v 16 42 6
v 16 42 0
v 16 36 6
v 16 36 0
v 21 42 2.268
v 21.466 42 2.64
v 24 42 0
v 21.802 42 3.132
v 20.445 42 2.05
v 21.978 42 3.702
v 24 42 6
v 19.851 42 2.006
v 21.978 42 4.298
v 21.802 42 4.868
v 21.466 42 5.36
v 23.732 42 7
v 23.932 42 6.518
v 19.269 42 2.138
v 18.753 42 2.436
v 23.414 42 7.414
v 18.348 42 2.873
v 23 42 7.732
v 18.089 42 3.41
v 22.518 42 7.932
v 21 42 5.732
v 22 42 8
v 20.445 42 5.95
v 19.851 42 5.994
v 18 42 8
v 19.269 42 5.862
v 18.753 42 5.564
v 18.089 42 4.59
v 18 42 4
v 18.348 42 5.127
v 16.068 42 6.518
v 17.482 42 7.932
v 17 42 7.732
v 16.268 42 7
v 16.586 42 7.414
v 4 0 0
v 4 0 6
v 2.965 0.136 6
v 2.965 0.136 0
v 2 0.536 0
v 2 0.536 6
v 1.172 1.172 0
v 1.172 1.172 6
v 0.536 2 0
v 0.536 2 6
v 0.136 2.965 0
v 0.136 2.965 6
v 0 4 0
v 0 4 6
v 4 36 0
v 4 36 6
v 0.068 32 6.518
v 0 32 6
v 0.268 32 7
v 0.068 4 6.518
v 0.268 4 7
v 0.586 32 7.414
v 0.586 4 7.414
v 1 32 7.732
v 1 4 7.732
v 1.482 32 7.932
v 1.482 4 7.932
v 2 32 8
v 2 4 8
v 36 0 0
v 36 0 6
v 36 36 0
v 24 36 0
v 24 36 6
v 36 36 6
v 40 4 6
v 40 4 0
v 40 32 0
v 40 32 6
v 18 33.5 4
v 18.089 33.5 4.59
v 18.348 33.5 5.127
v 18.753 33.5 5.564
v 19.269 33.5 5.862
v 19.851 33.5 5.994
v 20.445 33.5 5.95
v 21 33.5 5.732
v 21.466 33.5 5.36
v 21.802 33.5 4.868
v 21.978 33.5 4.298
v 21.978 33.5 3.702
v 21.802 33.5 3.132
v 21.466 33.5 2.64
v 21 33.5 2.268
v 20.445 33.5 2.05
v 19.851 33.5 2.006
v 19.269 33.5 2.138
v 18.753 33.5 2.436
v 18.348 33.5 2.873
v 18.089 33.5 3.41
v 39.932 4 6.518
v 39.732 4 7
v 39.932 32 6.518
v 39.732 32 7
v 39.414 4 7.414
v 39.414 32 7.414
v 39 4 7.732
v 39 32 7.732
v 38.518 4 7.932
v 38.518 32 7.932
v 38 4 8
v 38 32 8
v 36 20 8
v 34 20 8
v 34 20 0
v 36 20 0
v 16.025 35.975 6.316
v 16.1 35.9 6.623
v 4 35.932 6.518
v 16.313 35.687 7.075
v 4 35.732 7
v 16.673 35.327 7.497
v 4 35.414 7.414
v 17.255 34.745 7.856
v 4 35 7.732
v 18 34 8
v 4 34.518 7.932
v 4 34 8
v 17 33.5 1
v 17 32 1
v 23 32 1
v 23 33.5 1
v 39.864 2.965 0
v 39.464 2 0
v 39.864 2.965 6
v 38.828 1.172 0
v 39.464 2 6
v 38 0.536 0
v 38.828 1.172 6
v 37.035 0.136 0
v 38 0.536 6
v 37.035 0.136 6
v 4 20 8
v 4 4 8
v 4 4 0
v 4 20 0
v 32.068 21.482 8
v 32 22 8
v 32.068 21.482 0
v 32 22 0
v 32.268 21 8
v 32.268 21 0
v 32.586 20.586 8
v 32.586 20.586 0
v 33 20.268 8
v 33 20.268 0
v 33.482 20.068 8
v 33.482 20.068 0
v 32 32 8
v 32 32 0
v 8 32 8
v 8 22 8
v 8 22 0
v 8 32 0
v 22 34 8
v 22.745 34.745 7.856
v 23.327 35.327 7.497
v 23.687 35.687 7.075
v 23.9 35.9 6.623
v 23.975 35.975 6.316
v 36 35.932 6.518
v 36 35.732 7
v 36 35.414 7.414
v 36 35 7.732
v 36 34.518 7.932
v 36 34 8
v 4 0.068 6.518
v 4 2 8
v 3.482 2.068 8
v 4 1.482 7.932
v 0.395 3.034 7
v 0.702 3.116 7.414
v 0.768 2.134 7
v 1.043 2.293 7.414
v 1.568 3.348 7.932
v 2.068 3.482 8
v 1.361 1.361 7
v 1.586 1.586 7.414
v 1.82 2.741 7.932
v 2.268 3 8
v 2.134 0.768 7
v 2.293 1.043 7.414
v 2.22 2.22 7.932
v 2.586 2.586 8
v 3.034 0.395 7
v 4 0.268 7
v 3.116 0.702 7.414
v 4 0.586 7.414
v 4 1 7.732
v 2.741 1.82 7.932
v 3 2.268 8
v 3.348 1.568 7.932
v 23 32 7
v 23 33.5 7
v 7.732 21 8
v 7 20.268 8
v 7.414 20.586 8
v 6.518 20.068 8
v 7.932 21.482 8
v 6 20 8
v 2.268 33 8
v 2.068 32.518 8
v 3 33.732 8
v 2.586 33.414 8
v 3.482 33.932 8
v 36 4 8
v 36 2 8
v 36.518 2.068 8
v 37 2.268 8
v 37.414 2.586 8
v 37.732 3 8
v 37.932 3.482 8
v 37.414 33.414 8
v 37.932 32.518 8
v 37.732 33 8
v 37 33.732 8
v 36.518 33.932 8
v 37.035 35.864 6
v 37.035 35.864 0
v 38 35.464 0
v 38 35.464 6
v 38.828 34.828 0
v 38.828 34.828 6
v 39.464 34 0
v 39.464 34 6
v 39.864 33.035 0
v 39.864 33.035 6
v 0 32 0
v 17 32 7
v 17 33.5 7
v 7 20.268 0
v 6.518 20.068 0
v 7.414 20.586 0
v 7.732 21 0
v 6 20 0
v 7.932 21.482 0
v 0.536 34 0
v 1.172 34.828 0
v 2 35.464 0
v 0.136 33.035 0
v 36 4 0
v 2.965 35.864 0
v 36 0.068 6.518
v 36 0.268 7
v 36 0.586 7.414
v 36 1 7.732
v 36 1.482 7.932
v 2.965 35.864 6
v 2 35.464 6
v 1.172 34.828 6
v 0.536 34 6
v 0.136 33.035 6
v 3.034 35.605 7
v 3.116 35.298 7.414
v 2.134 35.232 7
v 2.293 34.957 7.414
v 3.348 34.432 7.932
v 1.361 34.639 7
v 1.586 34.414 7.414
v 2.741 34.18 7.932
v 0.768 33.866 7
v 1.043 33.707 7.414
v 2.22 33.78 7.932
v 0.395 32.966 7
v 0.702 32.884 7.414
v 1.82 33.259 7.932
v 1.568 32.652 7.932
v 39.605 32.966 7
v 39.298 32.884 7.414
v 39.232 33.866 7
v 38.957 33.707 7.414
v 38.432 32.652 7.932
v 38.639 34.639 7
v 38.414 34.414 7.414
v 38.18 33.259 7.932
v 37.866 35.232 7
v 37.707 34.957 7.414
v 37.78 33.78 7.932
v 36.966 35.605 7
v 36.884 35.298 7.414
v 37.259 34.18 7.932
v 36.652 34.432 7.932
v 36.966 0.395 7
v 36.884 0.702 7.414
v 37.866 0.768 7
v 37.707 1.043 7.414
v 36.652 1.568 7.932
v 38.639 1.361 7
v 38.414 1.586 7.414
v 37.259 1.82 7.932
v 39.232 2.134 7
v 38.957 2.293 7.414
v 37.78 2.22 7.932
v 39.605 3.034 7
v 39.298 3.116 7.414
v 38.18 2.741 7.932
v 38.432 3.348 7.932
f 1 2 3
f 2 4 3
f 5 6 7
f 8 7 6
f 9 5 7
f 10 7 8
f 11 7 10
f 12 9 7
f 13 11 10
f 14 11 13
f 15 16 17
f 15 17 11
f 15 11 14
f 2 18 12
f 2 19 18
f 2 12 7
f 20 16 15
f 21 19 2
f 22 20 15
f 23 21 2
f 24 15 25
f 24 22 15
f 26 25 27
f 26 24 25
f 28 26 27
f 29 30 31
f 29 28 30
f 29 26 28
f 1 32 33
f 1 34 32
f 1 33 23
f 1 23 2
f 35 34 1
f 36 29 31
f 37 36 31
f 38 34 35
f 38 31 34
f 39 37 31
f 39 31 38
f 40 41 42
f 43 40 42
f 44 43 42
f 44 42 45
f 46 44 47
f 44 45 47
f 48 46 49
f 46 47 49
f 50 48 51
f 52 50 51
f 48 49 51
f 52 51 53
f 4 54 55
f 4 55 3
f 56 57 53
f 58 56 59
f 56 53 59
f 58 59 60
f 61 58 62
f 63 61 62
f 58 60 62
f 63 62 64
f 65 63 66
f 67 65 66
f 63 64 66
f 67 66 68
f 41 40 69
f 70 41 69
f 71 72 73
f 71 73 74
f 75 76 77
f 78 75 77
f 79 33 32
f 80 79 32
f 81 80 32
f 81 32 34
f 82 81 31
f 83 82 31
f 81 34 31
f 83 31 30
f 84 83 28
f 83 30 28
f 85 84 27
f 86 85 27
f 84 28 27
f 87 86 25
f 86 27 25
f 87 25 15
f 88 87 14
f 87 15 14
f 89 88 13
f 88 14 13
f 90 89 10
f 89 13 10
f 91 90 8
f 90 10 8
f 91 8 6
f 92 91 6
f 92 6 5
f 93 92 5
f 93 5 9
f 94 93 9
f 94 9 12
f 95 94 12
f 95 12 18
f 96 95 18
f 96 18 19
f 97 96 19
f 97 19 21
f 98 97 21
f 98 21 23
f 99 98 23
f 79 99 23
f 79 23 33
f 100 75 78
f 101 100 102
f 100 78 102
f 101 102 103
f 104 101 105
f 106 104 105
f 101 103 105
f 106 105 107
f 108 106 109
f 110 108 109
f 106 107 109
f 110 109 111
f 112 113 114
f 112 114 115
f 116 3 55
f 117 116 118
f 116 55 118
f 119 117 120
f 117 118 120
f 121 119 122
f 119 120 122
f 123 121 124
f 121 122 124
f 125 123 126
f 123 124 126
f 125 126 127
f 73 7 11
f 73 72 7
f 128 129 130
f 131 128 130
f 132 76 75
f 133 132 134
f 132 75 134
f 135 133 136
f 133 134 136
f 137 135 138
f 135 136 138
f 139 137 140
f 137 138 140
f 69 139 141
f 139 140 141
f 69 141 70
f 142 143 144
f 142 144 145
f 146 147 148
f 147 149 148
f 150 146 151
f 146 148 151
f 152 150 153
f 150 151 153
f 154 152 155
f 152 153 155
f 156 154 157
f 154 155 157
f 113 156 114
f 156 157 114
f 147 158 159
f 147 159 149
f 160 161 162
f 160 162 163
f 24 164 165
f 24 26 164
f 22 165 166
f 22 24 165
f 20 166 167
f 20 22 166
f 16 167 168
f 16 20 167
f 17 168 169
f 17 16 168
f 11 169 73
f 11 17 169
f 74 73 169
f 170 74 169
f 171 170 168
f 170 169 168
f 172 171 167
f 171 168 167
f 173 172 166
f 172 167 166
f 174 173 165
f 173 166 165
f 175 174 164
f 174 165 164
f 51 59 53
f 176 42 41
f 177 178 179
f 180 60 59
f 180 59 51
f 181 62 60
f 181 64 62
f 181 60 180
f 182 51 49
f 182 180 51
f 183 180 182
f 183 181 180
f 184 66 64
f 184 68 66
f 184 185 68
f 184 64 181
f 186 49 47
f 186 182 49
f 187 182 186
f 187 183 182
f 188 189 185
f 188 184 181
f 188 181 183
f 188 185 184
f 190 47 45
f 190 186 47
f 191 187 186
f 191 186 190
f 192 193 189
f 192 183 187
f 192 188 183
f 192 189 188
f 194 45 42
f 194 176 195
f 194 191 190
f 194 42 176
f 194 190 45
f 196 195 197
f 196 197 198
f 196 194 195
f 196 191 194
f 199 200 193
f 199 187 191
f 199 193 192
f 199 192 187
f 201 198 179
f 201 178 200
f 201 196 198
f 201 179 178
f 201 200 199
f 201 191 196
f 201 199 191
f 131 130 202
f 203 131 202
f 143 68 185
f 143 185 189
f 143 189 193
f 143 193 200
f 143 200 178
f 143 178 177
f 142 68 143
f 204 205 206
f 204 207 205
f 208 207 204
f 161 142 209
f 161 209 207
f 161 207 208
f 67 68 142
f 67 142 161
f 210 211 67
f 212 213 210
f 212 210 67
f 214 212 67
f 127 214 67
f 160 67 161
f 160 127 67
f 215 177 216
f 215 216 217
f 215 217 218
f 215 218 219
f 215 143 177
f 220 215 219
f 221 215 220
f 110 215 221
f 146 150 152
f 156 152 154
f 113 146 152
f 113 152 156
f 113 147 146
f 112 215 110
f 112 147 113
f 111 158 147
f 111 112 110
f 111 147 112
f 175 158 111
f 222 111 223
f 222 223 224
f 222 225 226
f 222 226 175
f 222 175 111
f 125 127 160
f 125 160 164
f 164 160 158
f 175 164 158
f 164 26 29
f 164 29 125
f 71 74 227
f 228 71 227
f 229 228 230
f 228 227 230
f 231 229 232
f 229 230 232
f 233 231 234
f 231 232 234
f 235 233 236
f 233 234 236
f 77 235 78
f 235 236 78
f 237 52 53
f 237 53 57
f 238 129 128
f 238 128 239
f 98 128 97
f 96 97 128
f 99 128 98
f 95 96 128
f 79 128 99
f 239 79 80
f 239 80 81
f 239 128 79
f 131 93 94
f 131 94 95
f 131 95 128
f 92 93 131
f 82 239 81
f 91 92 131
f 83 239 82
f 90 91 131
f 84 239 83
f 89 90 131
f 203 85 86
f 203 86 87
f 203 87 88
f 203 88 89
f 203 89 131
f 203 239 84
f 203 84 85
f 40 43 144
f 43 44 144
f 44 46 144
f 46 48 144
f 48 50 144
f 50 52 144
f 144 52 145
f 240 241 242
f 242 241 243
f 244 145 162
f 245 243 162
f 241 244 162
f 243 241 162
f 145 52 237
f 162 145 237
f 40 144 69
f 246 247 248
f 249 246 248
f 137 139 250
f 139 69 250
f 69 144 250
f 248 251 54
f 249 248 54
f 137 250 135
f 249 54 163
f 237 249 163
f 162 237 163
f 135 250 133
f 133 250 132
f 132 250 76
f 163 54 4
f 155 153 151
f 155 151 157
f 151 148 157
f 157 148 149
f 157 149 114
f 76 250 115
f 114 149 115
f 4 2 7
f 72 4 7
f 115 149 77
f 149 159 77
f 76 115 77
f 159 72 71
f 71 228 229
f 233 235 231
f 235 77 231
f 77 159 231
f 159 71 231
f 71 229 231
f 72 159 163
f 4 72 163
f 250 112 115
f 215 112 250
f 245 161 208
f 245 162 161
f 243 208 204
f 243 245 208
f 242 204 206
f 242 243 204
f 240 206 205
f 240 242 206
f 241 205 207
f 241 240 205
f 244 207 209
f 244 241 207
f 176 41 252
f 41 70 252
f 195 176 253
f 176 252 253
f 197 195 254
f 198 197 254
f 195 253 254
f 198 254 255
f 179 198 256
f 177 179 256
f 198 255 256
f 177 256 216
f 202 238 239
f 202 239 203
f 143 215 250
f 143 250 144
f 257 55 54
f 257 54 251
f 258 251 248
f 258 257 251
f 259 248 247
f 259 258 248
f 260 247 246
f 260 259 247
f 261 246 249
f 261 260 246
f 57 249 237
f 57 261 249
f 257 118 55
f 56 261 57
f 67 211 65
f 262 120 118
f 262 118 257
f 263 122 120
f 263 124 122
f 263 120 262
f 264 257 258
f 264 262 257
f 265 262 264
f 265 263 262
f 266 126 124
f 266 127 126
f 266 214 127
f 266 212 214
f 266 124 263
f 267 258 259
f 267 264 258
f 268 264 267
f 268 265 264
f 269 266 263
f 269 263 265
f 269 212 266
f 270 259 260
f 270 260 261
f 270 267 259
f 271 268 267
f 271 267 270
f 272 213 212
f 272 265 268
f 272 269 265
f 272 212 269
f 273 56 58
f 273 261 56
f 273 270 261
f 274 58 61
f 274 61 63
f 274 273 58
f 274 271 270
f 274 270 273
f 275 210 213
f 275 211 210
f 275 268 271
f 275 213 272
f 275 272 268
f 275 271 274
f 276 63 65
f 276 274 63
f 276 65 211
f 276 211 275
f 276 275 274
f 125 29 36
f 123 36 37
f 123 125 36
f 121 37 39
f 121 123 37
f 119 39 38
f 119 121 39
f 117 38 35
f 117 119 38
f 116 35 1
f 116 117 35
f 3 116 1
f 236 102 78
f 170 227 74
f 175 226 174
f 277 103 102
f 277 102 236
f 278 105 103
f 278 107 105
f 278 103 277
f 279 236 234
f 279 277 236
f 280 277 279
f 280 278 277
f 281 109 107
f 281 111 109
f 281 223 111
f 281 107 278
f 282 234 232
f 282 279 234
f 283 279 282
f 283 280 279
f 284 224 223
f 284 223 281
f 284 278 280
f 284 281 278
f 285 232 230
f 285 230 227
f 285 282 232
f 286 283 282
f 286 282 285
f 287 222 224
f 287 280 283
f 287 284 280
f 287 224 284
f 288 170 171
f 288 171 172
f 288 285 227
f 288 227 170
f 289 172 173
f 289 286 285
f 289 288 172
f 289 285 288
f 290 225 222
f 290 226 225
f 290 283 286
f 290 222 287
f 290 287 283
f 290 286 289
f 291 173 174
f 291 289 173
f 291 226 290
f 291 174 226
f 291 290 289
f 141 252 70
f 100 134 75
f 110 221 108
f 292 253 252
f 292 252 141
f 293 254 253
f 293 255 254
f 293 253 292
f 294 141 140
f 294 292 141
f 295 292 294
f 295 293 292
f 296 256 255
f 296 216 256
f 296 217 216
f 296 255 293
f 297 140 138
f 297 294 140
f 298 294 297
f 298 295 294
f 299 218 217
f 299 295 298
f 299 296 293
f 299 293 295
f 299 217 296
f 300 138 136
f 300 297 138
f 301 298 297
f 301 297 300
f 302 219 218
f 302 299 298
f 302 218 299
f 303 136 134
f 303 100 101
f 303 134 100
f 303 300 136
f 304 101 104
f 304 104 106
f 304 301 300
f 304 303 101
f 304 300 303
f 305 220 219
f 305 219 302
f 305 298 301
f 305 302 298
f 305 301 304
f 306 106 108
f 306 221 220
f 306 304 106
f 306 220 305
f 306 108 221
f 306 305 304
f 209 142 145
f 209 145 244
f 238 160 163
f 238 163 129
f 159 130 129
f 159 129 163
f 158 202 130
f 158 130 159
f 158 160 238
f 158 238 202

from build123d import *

# Parameters (mm, degrees)
SKETCH_W        = 40
SKETCH_H        = 36
PAD_DEPTH       = 8
POCKET_DEPTH    = 8
FILLET_R        = 4
FILLET001_R     = 4
FILLET002_R     = 4
FILLET003_R     = 4
SKETCH002_W     = 8
SKETCH002_H     = 8
PAD001_DEPTH    = 6
FILLET004_R     = 2
FILLET005_R     = 2
FILLET006_R     = 2
FILLET007_R     = 2
FILLET008_R     = 2
SKETCH003_R     = 2
POCKET001_DEPTH = 10
SKETCH004_W     = 6
SKETCH004_H     = 6
POCKET002_DEPTH = 1.5


with BuildPart() as part:
    # Sketch → Pad (new body)
    with BuildSketch(Plane.XY):
        with Locations((20, 18)):
            Rectangle(SKETCH_W, SKETCH_H)
    extrude(amount=PAD_DEPTH)

    # Sketch001 → Pocket (cut)
    with BuildSketch(Plane.XY.offset(8)):
        Polygon((4, 4), (4, 20), (8, 20), (8, 32), (32, 32), (32, 20), (36, 20), (36, 4), align=None)
    extrude(amount=-POCKET_DEPTH, mode=Mode.SUBTRACT)

    # Fillet
    fillet_edges = [part.edges().sort_by_distance(p)[0] for p in [
        (40, 36, 4),
    ]]
    fillet(fillet_edges, radius=FILLET_R)

    # Fillet001
    fillet001_edges = [part.edges().sort_by_distance(p)[0] for p in [
        (0, 36, 4),
    ]]
    fillet(fillet001_edges, radius=FILLET001_R)

    # Fillet002
    fillet002_edges = [part.edges().sort_by_distance(p)[0] for p in [
        (40, 0, 4),
    ]]
    fillet(fillet002_edges, radius=FILLET002_R)

    # Fillet003
    fillet003_edges = [part.edges().sort_by_distance(p)[0] for p in [
        (0, 0, 4),
    ]]
    fillet(fillet003_edges, radius=FILLET003_R)

    # Sketch002 → Pad001 (new body)
    with BuildSketch(Plane(origin=(0, 36, 0), x_dir=(-1, 0, 0), z_dir=(0, 1, 0))):
        with Locations((-20, 4)):
            Rectangle(SKETCH002_W, SKETCH002_H)
    extrude(amount=PAD001_DEPTH)

    # Fillet004
    fillet004_edges = [part.edges().sort_by_distance(p)[0] for p in [
        (40, 18, 8),
    ]]
    fillet(fillet004_edges, radius=FILLET004_R)

    # Fillet005
    fillet005_edges = [part.edges().sort_by_distance(p)[0] for p in [
        (8, 20, 4),
    ]]
    fillet(fillet005_edges, radius=FILLET005_R)

    # Fillet006
    fillet006_edges = [part.edges().sort_by_distance(p)[0] for p in [
        (32, 20, 4),
    ]]
    fillet(fillet006_edges, radius=FILLET006_R)

    # Fillet007
    fillet007_edges = [part.edges().sort_by_distance(p)[0] for p in [
        (24, 39, 8),
    ]]
    fillet(fillet007_edges, radius=FILLET007_R)

    # Fillet008
    fillet008_edges = [part.edges().sort_by_distance(p)[0] for p in [
        (16, 39, 8),
    ]]
    fillet(fillet008_edges, radius=FILLET008_R)

    # Sketch003 → Pocket001 (cut)
    with BuildSketch(Plane(origin=(0, 42, 0), x_dir=(-1, 0, 0), z_dir=(0, 1, 0))):
        with Locations((-20, 4)):
            Circle(SKETCH003_R)
    extrude(amount=-POCKET001_DEPTH, mode=Mode.SUBTRACT)

    # Sketch004 → Pocket002 (cut)
    with BuildSketch(Plane.XZ.offset(-32)):
        with Locations((20, 4)):
            Rectangle(SKETCH004_W, SKETCH004_H)
    extrude(amount=-POCKET002_DEPTH, mode=Mode.SUBTRACT)


solid = part.part
